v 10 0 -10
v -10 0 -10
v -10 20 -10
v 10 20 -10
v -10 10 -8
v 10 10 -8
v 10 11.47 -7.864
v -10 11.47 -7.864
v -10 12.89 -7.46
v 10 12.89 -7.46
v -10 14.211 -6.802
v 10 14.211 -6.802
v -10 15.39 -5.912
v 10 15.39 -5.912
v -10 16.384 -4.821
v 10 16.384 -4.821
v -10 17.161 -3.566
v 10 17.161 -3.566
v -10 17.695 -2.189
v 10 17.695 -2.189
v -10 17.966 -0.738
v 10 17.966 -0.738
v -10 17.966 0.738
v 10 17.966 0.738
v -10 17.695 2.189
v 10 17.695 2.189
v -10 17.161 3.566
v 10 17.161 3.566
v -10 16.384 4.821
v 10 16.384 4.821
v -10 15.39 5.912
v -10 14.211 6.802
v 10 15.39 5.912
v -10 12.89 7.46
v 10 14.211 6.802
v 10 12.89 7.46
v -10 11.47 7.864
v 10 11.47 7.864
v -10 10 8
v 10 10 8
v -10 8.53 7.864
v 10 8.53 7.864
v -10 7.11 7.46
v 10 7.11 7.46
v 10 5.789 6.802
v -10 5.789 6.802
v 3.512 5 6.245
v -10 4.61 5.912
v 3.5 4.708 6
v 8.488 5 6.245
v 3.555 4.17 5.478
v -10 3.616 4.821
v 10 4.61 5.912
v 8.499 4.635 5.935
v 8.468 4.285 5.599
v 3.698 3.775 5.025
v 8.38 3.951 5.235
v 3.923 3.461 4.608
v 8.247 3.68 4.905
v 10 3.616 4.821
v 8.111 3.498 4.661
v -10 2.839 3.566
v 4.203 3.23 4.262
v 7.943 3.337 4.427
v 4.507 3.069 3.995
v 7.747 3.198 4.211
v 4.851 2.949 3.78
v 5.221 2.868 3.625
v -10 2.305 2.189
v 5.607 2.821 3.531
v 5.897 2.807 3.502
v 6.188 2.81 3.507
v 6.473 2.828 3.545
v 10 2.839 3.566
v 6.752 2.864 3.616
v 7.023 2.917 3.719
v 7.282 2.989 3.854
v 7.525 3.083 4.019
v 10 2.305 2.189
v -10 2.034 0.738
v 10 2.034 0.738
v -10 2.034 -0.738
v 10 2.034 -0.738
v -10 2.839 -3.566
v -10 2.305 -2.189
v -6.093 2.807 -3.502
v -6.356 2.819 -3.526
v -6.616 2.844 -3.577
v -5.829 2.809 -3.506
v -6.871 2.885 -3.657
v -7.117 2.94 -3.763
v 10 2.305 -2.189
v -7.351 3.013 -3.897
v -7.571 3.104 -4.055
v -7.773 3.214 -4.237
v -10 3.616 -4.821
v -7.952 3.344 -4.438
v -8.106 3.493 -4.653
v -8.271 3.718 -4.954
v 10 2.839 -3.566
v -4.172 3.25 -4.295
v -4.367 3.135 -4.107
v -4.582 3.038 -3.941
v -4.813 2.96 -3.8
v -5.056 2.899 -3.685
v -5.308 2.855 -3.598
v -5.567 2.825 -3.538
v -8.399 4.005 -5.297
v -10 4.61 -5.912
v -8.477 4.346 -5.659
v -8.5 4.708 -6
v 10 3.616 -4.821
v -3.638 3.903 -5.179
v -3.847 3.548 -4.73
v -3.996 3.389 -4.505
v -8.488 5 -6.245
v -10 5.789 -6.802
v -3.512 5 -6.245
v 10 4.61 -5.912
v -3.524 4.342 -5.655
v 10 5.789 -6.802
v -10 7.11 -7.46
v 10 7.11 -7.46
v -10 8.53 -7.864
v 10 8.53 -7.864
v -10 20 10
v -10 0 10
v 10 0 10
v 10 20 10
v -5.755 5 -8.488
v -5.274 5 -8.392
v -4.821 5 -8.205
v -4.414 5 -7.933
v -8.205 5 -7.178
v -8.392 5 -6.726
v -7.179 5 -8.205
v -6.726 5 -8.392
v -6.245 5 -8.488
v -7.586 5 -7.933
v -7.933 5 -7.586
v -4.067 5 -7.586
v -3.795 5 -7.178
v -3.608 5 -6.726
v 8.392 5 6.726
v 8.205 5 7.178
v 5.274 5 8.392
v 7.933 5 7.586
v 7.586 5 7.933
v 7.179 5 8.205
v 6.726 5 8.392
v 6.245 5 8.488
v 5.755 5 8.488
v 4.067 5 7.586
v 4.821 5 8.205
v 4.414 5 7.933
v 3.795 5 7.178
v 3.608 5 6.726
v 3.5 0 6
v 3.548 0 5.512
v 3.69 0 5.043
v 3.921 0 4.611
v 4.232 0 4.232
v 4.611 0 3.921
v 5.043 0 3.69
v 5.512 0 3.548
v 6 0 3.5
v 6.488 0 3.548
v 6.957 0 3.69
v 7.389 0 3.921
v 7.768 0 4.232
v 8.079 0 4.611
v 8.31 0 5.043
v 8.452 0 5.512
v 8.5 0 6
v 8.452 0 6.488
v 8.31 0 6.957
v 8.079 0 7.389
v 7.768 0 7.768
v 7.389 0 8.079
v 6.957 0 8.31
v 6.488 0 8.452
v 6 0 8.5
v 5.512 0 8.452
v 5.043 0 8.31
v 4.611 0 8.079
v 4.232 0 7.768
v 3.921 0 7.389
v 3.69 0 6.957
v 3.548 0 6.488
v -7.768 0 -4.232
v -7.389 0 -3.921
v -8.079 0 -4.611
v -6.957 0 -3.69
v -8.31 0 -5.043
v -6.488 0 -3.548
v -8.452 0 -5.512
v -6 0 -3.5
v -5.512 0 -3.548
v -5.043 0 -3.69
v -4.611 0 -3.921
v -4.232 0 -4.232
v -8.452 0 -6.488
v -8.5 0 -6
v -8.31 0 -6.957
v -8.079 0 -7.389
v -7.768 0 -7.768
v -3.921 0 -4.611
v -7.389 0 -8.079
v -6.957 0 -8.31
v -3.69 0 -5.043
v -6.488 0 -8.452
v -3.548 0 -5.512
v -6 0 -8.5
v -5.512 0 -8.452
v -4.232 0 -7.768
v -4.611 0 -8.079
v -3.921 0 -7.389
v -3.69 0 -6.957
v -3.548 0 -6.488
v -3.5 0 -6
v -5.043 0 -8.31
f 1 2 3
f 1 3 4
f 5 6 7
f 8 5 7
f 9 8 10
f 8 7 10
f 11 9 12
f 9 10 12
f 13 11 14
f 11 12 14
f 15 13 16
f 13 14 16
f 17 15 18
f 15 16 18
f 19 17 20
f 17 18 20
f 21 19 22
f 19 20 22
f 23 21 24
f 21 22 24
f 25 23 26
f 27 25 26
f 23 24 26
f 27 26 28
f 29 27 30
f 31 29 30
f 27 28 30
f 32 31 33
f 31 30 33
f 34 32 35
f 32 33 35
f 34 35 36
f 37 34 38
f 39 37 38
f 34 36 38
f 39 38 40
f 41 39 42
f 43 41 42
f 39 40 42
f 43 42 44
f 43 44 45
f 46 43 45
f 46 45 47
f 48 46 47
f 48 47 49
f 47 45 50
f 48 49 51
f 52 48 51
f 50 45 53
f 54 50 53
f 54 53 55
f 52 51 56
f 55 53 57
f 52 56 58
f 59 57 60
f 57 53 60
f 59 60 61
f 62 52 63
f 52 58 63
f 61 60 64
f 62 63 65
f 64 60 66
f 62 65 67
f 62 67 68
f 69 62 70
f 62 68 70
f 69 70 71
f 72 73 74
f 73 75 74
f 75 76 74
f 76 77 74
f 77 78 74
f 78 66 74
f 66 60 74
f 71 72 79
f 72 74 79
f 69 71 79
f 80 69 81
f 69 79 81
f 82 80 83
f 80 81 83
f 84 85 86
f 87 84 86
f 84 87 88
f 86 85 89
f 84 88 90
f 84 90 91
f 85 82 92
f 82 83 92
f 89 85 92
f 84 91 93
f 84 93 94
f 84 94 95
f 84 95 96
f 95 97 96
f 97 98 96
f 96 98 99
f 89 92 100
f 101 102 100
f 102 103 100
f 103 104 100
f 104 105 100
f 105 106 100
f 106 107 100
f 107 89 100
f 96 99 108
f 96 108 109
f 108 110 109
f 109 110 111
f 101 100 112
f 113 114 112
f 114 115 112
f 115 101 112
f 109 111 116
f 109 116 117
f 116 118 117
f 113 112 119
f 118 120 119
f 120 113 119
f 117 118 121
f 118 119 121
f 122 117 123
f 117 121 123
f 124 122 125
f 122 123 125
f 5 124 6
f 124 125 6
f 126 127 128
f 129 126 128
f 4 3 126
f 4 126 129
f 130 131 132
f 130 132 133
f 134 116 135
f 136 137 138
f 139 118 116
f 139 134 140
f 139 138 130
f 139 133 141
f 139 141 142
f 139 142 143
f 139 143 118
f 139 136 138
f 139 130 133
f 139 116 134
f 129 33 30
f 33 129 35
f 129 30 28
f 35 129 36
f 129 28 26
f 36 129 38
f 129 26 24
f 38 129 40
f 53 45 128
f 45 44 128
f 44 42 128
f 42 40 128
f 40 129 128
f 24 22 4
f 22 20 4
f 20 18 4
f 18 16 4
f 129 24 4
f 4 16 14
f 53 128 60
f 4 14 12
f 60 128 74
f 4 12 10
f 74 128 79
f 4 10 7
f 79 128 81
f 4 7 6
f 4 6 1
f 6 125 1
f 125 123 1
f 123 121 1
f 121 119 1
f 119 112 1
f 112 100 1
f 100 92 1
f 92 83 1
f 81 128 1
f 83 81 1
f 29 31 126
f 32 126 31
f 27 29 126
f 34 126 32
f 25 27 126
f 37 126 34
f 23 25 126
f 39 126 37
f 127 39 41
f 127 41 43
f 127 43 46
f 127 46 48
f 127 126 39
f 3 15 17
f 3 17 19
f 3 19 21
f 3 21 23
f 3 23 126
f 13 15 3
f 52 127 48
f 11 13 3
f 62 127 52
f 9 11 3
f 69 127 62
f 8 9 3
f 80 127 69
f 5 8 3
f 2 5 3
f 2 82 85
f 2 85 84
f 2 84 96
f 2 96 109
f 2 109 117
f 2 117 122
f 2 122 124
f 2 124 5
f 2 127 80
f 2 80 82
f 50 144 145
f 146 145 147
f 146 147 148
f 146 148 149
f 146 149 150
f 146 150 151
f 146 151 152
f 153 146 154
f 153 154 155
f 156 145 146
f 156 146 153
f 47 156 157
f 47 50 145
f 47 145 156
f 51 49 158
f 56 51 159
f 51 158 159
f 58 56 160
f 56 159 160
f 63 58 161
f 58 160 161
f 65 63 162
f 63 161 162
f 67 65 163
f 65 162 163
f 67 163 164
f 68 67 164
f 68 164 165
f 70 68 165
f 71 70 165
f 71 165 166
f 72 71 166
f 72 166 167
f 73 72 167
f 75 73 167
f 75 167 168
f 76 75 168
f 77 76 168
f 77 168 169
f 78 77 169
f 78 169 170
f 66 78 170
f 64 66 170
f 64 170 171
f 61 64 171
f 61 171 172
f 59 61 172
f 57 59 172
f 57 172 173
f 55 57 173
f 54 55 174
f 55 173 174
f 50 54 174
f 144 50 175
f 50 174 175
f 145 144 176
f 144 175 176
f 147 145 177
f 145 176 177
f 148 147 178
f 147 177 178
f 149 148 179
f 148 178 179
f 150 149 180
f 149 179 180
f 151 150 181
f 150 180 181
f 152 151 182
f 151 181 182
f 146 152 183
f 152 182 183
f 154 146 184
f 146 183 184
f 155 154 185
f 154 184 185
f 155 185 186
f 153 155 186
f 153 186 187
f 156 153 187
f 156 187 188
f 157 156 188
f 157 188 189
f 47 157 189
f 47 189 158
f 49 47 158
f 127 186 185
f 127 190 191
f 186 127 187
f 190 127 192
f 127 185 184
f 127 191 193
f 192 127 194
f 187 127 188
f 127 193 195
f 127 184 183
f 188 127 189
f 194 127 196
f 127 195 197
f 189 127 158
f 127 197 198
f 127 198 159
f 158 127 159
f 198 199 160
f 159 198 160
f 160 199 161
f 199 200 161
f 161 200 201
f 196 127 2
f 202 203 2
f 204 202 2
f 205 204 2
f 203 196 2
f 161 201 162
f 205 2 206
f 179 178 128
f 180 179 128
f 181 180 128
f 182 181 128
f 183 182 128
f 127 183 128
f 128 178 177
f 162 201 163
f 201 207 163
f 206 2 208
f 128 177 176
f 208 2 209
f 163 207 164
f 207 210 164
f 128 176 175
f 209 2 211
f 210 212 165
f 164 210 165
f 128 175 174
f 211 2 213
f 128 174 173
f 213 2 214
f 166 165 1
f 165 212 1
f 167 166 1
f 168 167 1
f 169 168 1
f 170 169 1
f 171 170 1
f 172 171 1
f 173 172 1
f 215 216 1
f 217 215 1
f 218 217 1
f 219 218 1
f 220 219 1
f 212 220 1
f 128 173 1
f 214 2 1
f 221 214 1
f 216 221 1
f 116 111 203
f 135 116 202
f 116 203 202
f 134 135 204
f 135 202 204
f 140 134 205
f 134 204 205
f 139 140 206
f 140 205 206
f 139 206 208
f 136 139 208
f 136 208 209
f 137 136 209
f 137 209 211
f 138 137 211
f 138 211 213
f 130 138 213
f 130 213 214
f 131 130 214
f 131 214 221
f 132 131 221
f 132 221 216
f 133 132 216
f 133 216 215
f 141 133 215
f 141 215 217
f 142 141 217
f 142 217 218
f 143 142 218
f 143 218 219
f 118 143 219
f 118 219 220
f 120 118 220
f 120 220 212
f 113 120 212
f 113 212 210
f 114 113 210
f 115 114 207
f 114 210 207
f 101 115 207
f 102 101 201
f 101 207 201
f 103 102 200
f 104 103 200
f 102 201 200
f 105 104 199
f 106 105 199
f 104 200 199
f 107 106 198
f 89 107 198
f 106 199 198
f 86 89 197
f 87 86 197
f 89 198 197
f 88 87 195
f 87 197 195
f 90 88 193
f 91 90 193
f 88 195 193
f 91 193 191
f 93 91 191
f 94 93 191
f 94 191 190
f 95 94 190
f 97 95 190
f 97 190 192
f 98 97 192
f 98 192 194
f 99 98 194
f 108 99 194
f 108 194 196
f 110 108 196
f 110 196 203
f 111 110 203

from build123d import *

# Parameters (mm, degrees)
SKETCH1_W               = 20
SKETCH1_H               = 20
BOSS_EXTRUDE1_DEPTH     = 20
SKETCH2_R               = 8
CUT_EXTRUDE1_DEPTH      = 20
CUT_EXTRUDE1_DEPTH_BACK = 20
SKETCH3_R               = 2.5
CUT_EXTRUDE2_DEPTH      = 5


with BuildPart() as part:
    # Sketch1 → Boss-Extrude1 (new body)
    with BuildSketch(Plane(origin=(0, 0, 0), x_dir=(1, 0, 0), z_dir=(0, 1, 0))):
        Rectangle(SKETCH1_W, SKETCH1_H)
    extrude(amount=BOSS_EXTRUDE1_DEPTH)

    # Sketch2 → Cut-Extrude1 (cut, two sides)
    with BuildSketch(Plane(origin=(0, 0, 0), x_dir=(0, 0, -1), z_dir=(1, 0, 0))) as cut_extrude1_sk:
        with Locations((0, 10)):
            Circle(SKETCH2_R)
    extrude(amount=CUT_EXTRUDE1_DEPTH, mode=Mode.SUBTRACT)
    extrude(cut_extrude1_sk.sketch, amount=-CUT_EXTRUDE1_DEPTH_BACK, mode=Mode.SUBTRACT)

    # Sketch3 → Cut-Extrude2 (cut)
    with BuildSketch(Plane(origin=(0, 0, 0), x_dir=(-1, 0, 0), z_dir=(0, -1, 0))):
        with Locations((-6, -6)):
            Circle(SKETCH3_R)
        with Locations((6, 6)):
            Circle(SKETCH3_R)
    extrude(amount=-CUT_EXTRUDE2_DEPTH, mode=Mode.SUBTRACT)


solid = part.part
